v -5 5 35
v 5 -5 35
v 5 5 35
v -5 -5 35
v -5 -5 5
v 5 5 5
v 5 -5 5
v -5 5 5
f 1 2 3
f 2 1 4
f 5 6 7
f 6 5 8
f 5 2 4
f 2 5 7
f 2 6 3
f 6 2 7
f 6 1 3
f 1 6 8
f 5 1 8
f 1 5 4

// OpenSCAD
X=0;
Y=1;
Z=2;

A = [30,30,10];
B = [10,10,30];

posB=[0,0,B[Z]/2 +A[Z]/2];

%cube(A,center=true);

translate(posB)
    cube(B, center=true);
